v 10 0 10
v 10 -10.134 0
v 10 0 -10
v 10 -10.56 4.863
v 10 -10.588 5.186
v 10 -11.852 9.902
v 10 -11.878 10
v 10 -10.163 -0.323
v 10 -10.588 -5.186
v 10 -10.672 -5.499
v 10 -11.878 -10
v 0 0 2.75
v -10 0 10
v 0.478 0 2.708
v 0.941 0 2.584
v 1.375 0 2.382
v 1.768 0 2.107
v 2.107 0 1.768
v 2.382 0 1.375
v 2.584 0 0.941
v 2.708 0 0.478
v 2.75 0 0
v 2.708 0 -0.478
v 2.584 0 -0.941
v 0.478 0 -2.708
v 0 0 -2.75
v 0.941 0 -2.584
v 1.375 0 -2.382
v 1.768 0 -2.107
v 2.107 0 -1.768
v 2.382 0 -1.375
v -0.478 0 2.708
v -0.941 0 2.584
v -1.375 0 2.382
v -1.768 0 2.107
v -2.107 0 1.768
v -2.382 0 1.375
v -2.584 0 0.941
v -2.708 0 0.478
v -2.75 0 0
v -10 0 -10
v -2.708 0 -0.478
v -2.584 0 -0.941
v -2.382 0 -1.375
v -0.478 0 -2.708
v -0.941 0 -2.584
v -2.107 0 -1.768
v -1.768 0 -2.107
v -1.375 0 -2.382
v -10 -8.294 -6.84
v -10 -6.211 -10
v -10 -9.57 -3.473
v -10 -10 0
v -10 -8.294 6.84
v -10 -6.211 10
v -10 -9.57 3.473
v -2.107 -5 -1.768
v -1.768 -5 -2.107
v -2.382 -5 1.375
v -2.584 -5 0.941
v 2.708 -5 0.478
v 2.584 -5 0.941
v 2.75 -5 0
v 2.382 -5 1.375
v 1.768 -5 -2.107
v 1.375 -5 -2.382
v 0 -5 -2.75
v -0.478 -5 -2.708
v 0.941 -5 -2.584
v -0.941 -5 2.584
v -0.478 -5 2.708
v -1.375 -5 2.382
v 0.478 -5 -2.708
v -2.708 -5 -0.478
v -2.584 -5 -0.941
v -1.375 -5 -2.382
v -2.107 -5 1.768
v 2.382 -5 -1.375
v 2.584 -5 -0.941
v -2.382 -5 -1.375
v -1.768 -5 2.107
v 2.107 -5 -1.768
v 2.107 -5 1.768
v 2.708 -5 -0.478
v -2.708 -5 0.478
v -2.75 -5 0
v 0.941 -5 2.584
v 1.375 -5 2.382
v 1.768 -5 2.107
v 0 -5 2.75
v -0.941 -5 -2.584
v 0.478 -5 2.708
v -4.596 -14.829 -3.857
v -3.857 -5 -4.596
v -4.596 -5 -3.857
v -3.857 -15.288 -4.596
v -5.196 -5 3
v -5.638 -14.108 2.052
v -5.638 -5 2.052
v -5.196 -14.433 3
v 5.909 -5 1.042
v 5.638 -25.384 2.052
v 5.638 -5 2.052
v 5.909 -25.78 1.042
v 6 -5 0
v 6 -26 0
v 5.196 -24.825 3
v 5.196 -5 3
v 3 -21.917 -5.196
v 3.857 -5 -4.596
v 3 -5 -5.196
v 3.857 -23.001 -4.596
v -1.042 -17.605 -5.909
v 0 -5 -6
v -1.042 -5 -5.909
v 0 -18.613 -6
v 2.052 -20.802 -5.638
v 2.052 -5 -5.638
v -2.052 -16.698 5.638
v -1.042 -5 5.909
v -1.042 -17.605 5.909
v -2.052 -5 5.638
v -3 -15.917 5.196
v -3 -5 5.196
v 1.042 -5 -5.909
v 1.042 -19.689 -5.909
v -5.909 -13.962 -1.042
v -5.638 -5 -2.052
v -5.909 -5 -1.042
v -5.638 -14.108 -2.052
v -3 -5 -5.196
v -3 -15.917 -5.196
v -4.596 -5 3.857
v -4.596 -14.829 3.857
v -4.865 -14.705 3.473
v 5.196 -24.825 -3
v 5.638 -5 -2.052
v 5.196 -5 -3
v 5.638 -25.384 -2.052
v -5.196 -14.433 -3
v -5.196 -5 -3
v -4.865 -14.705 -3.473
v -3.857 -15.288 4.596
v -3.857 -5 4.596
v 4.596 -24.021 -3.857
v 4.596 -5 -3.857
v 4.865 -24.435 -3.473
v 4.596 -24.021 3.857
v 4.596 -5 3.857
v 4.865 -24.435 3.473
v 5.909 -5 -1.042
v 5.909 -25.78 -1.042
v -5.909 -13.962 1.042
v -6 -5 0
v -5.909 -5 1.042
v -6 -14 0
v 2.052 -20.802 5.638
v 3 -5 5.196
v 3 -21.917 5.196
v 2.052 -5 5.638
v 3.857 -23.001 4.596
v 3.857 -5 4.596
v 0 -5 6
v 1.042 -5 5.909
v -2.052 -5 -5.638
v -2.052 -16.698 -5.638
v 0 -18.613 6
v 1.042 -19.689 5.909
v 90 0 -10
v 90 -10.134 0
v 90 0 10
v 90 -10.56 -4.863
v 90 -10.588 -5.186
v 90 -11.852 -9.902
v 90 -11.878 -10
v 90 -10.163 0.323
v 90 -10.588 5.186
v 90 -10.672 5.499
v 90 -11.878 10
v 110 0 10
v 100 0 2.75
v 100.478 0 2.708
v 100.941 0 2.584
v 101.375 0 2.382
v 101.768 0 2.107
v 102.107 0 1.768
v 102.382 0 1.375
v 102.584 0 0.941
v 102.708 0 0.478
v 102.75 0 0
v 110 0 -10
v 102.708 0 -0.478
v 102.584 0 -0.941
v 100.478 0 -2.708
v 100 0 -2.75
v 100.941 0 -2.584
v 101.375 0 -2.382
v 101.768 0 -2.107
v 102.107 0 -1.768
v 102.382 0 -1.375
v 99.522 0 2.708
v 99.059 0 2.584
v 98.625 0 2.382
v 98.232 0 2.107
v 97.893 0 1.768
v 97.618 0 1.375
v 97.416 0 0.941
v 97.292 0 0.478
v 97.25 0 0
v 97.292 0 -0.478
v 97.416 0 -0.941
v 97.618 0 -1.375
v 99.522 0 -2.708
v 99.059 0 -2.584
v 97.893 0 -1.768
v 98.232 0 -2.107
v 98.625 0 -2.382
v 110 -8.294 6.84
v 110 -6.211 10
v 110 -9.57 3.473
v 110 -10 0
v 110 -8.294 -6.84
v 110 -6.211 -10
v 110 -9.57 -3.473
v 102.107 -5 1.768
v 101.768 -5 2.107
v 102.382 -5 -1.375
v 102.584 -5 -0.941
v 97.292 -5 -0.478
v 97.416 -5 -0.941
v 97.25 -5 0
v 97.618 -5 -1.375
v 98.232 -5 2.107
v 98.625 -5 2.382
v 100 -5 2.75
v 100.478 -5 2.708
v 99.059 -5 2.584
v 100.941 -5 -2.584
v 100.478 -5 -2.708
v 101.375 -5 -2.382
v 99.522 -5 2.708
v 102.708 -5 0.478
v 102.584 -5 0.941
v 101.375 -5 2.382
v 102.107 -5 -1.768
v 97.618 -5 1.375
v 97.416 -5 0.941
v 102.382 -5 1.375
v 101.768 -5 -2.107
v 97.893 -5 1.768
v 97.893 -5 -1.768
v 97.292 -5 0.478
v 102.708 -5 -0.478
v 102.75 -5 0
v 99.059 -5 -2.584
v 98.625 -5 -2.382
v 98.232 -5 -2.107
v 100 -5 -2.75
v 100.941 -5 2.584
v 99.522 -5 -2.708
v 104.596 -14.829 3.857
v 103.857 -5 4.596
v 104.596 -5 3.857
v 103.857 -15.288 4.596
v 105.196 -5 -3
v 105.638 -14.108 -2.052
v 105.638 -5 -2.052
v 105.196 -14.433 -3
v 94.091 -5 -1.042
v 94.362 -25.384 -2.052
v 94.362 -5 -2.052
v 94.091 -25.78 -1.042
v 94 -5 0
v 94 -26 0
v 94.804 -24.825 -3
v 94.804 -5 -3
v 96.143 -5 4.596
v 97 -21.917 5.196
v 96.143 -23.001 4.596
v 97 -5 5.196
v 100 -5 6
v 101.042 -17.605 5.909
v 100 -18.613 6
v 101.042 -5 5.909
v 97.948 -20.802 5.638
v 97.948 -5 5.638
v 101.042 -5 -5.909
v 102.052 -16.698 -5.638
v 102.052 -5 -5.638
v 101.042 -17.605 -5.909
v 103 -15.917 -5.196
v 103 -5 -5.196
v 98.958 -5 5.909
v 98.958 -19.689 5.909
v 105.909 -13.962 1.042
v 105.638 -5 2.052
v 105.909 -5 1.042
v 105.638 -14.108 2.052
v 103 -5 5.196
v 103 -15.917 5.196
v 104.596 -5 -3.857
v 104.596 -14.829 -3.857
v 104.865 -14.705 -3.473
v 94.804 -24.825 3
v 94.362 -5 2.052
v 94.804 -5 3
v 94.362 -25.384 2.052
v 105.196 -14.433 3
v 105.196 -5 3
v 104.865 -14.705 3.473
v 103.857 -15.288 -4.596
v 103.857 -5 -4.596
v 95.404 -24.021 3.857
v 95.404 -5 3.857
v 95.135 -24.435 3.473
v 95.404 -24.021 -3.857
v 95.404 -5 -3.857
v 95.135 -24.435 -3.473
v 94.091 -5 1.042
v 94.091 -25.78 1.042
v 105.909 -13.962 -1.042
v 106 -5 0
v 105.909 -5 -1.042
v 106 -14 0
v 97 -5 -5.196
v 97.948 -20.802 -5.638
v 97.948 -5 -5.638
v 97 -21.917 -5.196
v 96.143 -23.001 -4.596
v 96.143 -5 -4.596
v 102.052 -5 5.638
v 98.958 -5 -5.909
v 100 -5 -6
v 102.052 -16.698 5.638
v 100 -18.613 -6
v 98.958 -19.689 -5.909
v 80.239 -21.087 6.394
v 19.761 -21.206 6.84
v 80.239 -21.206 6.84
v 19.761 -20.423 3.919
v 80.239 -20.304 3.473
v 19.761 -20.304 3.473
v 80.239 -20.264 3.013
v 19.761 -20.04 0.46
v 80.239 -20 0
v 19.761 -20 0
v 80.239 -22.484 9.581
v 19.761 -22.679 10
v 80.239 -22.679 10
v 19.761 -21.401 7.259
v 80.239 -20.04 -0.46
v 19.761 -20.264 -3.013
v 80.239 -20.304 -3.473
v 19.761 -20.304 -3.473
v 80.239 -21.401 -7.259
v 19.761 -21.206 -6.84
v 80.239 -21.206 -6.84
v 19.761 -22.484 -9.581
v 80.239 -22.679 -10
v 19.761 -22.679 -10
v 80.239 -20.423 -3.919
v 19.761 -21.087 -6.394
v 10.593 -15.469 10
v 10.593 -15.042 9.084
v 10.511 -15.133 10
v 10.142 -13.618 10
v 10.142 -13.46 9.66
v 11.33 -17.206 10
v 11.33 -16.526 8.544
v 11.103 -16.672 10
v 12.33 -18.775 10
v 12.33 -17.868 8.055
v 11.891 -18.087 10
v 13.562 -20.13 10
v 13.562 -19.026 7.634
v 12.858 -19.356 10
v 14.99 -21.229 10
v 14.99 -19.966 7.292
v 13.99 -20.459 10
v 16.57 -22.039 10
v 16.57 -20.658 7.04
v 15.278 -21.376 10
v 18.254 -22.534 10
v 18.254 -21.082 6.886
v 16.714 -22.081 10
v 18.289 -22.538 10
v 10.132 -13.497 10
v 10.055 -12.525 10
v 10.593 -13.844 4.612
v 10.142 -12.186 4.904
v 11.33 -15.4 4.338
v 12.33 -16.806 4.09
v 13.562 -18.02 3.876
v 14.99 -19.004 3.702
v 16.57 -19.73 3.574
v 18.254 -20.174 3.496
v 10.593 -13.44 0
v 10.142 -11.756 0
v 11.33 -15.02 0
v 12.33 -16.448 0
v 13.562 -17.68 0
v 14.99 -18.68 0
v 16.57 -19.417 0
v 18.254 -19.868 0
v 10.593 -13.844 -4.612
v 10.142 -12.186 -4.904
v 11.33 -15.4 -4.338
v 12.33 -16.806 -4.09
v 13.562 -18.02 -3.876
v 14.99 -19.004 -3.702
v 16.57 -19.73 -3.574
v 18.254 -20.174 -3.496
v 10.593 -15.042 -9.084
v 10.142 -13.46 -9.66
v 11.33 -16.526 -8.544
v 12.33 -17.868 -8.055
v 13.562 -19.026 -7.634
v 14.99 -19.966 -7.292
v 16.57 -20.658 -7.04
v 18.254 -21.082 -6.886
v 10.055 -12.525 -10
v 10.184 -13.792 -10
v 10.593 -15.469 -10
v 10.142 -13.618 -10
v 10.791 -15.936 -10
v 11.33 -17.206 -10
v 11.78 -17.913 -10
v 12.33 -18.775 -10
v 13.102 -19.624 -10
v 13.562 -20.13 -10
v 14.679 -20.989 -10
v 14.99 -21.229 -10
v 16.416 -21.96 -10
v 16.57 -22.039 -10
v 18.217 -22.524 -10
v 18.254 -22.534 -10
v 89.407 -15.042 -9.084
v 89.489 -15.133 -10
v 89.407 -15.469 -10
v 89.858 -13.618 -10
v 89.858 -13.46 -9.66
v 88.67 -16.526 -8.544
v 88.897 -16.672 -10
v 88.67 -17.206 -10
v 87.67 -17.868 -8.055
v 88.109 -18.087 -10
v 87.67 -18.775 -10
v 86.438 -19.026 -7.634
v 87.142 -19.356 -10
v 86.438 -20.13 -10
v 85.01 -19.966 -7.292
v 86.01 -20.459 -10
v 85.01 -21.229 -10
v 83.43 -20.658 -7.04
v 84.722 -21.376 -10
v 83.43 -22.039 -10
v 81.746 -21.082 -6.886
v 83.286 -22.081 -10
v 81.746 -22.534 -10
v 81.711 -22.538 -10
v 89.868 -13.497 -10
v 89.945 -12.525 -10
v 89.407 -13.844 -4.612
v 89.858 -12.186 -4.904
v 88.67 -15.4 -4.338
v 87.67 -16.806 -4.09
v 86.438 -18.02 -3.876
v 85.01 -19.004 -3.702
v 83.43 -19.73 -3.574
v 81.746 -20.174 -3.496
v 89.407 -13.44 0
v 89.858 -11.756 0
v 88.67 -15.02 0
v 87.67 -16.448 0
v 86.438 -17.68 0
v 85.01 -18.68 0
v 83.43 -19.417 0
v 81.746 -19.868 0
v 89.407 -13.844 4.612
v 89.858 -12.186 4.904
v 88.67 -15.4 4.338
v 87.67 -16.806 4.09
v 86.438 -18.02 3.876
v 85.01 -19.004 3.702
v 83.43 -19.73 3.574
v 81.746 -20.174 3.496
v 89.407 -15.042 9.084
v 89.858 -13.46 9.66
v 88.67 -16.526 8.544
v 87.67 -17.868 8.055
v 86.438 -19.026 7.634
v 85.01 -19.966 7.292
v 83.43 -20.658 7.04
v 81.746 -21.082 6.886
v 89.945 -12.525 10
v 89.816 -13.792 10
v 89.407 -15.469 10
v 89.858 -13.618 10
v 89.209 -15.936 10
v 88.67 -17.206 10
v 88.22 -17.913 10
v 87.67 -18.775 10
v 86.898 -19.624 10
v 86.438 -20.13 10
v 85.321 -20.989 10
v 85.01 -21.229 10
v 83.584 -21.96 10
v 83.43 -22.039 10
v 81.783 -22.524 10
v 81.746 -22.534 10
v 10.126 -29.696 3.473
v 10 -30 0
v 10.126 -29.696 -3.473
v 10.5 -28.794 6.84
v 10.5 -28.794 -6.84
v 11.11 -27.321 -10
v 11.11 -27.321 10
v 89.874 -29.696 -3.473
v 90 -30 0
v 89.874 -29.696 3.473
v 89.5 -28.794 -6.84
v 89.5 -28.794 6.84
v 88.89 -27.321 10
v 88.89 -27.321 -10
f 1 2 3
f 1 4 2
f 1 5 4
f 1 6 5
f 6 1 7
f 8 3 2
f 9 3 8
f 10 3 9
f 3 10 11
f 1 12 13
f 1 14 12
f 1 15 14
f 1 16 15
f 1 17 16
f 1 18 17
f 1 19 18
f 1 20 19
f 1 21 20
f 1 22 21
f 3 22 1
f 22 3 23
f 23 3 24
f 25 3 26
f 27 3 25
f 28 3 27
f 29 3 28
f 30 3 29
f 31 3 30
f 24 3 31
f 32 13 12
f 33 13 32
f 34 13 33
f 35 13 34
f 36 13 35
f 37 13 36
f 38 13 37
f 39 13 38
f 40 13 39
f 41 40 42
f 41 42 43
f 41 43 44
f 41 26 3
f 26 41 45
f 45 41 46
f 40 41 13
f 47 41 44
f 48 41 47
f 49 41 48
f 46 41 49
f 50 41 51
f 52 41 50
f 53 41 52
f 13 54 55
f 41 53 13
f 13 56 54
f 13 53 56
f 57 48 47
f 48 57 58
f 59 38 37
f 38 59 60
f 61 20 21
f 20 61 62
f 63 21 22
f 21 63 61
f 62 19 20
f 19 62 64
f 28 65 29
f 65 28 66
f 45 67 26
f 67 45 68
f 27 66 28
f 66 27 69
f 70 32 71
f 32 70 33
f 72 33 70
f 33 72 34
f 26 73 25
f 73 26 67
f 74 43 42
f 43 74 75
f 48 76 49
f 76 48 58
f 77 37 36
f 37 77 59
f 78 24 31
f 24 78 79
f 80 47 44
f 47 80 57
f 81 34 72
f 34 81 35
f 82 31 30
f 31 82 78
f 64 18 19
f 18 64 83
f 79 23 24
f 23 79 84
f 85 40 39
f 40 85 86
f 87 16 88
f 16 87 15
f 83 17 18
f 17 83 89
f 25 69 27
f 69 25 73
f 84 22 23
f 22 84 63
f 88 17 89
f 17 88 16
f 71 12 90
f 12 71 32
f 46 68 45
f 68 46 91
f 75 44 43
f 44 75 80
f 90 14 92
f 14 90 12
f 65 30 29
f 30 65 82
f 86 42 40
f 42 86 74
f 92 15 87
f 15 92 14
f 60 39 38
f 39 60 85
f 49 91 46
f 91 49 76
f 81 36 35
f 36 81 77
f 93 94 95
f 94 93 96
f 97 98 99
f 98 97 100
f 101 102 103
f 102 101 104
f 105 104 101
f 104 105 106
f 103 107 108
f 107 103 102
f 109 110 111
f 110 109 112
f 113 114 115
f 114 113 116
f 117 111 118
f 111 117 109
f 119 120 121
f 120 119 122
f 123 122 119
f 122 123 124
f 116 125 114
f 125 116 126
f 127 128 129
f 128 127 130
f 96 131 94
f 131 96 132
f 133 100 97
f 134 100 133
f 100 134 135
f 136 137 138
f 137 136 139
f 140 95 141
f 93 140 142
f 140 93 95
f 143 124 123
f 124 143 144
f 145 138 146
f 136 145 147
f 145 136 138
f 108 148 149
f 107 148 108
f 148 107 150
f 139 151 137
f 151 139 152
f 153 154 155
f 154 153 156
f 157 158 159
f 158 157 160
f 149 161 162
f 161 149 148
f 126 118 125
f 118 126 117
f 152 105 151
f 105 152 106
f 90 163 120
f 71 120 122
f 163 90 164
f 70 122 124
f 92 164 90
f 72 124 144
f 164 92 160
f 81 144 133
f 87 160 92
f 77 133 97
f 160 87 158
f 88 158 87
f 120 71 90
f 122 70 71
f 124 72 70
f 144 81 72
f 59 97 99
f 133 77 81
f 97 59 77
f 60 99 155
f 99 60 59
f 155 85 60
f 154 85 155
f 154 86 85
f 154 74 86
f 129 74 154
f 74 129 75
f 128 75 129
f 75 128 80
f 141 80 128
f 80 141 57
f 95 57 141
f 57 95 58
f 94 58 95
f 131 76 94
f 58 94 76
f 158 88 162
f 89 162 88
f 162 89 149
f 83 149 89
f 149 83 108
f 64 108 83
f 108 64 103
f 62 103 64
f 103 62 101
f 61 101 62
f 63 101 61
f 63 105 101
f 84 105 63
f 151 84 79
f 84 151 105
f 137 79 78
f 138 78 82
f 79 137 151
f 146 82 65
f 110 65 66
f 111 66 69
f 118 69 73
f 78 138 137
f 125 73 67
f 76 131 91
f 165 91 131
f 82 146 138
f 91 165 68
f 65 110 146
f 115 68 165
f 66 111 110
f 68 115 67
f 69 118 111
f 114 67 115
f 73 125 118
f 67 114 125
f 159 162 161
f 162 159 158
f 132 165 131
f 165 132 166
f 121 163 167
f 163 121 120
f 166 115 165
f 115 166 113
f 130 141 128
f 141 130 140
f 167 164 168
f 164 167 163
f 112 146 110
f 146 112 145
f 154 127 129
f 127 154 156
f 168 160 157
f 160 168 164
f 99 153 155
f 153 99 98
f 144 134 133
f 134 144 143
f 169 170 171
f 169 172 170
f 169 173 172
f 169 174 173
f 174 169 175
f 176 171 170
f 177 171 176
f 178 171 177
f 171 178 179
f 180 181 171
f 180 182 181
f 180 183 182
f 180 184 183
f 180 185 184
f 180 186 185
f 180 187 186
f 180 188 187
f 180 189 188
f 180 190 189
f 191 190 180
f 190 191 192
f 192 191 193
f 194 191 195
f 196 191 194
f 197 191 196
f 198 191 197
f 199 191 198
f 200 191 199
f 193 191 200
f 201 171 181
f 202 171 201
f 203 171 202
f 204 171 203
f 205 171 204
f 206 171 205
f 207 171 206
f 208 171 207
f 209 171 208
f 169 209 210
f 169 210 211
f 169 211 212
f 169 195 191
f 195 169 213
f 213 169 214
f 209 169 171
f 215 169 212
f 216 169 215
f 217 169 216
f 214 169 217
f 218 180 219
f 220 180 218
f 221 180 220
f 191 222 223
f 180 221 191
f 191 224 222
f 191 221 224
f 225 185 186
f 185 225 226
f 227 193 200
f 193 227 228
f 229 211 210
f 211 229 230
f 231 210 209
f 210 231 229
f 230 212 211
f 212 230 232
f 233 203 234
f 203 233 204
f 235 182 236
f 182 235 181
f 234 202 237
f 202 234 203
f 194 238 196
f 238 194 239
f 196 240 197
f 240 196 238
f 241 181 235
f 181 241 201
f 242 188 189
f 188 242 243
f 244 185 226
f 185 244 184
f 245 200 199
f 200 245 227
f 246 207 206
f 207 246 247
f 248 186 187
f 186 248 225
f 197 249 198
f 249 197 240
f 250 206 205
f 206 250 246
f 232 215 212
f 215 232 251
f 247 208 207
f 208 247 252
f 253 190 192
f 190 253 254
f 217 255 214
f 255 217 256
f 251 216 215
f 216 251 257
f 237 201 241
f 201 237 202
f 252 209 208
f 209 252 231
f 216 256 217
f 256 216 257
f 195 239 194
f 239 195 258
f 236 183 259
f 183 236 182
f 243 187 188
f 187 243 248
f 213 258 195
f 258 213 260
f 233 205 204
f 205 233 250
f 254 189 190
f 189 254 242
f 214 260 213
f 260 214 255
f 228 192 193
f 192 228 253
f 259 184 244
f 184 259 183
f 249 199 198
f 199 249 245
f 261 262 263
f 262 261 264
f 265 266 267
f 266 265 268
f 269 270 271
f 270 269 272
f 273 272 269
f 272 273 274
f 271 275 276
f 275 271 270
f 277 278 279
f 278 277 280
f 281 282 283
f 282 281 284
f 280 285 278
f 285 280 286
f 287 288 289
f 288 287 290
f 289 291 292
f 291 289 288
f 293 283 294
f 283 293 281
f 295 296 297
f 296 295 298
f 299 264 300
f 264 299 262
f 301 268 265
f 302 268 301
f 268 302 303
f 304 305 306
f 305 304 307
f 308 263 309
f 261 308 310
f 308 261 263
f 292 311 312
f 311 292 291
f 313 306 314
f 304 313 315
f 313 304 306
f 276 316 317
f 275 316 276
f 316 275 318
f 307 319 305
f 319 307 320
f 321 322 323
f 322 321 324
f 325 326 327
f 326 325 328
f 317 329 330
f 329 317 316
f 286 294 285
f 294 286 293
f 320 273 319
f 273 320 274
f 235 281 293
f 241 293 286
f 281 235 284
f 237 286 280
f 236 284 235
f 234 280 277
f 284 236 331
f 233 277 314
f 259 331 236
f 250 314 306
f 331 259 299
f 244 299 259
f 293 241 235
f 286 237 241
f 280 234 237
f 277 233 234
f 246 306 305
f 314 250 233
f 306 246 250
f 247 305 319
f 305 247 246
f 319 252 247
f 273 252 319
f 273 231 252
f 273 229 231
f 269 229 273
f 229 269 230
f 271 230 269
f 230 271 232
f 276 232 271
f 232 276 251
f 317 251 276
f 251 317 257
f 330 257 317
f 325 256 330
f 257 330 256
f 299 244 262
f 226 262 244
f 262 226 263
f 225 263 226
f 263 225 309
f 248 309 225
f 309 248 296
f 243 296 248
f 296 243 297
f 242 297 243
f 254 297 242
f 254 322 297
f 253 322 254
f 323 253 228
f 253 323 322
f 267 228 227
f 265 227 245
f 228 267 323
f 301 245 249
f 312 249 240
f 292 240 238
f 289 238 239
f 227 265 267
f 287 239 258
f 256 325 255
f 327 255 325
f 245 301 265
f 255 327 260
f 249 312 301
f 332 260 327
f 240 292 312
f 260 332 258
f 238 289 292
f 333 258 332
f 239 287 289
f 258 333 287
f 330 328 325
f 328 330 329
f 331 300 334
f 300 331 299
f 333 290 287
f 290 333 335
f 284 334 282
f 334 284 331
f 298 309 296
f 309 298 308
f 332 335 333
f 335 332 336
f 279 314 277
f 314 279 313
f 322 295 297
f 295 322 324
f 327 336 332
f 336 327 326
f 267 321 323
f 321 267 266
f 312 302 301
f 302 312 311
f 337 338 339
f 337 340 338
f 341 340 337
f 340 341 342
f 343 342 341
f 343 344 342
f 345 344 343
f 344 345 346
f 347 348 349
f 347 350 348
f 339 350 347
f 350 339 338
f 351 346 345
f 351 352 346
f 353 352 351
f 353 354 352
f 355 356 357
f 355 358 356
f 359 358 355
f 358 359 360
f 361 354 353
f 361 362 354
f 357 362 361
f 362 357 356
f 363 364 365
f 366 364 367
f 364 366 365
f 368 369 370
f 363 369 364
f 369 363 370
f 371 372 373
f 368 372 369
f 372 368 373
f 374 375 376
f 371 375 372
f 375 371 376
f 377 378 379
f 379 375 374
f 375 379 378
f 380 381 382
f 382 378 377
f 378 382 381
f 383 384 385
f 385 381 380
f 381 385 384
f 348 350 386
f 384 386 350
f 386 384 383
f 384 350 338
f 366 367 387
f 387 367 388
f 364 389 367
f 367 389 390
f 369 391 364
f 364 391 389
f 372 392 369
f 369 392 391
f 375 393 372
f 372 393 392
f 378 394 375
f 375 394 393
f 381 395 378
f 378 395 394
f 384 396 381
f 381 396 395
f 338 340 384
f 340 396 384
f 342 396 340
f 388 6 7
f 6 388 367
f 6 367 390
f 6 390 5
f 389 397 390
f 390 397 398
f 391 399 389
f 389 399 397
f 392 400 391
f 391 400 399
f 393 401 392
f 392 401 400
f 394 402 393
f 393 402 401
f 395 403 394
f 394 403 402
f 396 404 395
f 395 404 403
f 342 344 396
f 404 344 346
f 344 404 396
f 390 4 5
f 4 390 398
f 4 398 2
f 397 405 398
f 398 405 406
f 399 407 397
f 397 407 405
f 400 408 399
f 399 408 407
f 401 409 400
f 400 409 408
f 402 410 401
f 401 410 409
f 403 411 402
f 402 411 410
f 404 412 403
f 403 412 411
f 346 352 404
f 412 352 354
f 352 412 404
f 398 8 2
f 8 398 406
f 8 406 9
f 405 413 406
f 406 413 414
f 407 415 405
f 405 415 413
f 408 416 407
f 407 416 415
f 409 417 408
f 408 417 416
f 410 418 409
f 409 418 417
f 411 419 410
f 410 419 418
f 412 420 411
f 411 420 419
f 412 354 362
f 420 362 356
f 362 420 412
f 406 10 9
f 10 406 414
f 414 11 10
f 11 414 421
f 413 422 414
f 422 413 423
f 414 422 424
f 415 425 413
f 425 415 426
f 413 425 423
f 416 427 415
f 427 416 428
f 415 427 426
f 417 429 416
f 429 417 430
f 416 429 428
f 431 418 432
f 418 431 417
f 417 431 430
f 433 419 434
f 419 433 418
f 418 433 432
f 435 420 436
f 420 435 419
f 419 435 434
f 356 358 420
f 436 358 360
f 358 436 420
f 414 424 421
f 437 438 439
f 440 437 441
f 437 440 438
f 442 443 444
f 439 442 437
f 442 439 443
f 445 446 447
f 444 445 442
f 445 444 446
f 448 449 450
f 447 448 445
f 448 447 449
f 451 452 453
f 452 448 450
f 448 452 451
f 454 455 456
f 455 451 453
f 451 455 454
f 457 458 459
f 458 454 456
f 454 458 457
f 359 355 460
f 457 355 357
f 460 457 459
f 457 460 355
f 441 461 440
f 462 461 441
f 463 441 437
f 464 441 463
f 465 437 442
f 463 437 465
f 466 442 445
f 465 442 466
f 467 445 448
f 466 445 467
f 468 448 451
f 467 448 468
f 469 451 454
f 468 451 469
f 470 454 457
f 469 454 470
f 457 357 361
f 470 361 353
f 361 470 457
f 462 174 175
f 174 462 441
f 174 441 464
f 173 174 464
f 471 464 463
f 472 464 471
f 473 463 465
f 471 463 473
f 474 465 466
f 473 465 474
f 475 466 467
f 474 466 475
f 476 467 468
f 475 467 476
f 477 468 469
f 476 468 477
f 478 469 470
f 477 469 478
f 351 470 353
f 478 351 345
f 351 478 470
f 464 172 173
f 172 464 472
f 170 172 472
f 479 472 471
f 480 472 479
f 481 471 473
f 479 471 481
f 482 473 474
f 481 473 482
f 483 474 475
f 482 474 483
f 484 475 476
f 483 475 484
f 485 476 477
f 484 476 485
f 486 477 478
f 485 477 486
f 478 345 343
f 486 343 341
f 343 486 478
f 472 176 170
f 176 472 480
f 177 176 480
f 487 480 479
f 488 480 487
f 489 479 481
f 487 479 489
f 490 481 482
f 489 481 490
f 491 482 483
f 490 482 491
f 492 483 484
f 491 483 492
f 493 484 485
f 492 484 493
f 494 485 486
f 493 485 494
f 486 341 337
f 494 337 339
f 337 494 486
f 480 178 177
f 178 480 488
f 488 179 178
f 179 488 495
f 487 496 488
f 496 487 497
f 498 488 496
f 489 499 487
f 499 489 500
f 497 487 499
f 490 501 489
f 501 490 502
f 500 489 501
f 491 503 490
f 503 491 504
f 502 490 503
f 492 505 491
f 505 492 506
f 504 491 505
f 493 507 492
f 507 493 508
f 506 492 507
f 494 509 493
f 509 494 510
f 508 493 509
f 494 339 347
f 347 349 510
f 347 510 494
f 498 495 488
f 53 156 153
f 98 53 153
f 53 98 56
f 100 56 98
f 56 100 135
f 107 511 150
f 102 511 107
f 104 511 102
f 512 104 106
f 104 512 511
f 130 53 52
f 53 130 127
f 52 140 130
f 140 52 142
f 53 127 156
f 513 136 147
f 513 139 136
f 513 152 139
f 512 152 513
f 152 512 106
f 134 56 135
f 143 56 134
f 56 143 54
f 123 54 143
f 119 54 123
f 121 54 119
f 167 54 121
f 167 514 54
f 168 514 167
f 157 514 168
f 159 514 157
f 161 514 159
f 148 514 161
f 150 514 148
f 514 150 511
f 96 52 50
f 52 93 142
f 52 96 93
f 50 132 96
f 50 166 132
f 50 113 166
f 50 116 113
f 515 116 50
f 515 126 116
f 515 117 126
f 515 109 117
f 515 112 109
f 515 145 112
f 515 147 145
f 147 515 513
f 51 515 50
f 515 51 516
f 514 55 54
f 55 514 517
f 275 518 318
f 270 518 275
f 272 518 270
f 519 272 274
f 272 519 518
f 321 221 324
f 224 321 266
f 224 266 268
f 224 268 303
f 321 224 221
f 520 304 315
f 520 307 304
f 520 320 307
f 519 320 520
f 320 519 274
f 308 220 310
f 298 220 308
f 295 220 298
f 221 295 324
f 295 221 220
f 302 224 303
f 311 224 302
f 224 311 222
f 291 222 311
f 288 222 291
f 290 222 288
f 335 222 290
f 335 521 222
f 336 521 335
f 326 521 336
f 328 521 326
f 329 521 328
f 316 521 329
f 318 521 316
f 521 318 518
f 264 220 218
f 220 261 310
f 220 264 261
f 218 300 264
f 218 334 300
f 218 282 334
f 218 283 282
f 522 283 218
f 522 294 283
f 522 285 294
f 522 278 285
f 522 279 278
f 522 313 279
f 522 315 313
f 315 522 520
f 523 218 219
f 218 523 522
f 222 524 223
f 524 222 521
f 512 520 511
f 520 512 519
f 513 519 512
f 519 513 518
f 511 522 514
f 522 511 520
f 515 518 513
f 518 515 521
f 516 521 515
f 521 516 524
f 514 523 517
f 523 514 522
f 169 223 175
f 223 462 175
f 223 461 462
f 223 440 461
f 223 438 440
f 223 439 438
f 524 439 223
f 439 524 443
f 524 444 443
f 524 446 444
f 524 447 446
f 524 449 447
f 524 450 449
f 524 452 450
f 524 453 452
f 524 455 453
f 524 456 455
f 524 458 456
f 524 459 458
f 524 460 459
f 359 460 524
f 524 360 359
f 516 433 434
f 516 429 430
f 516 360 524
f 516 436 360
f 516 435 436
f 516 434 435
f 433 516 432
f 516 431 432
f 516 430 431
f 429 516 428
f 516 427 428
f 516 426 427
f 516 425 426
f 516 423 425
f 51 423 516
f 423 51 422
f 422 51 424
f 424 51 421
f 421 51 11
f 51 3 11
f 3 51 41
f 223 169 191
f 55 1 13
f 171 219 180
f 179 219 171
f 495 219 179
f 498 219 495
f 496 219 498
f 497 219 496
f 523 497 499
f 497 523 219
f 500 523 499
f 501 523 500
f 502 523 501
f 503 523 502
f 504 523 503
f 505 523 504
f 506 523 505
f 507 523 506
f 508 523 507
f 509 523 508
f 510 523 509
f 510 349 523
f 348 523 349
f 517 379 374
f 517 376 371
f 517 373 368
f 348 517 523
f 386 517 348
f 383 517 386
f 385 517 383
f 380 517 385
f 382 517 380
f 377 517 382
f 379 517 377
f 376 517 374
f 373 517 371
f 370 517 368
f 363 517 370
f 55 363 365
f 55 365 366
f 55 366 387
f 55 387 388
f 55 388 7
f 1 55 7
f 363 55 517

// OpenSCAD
// Source: https://www.thingiverse.com/thing:1107453/files
// License: CC+Attribution
length = 120;
width = 20;
height = 30;
boltHoleDiameter = 5.5;
boltCounterboreDiameter = 12;
bottomThickness = 5;
filletRadius = 10;
$fn=36;

rHandle = 2 * (width/2);

module side() {
  difference() {
    translate([-width/2,-width,0]) {
      cube([width,width*2,height]);
    }
    translate([0, 0, -1]) cylinder(d=boltHoleDiameter, h=height+2);
    translate([0, 0, bottomThickness])cylinder(d=boltCounterboreDiameter, h=height);
  }
}

module topCurve() {
  difference() {
    translate([0,-width-rHandle]) cube([length*2, width*2+rHandle*2, height+rHandle*2]);
    rotate([0,90,0]) cylinder(r=rHandle, h=length*2);
  }
}

module sideCuts() {
  translate([-width/2,0,height-width]) 
    rotate([0, -45, 0]) 
      translate([-10,0,-rHandle]) topCurve();
}

rotate([90,0,0])
difference() {
  union() {
    side();
    translate([length-width,0,0]) rotate([0,0,180]) side();
    translate([width/2-0.01,0,height+rHandle/2]) rotate([0,90,0]) {
       cylinder(r=rHandle, h=length-width*2+0.02);
       translate([0,0,filletRadius]) fil_polar_i(R = rHandle+filletRadius-0.02, r=filletRadius);
       translate([0,0,length-width*2+0.02-filletRadius]) rotate([180,0,0]) fil_polar_i(R = rHandle+filletRadius-0.02, r=filletRadius);
    }
  }
  sideCuts();
  translate([length-width,0,0]) rotate([0,0,180]) sideCuts();
  translate([-length,-width-width/2,-1]) cube([length*3,width, height*2]);
  translate([-length,width/2,-1]) cube([length*3,width, height*2]);
  translate([-width, 0, height-rHandle]) topCurve();
}





/* 
  openscad-fillets by jfhbrook 
  https://github.com/jfhbrook/openscad-fillets

  fillets.scad contents included below
*/ 

// 2d primitive for outside fillets.
module fil_2d_o(r, angle=90) {
  intersection() {
    circle(r=r);
    polygon([
      [0, 0],
      [0, r],
      [r * tan(angle/2), r],
      [r * sin(angle), r * cos(angle)]
    ]);
  }
}

// 2d primitive for inside fillets.
module fil_2d_i(r, angle=90) {
  difference() {
    polygon([
      [0, 0],
      [0, -r],
      [-r * tan(angle/2), -r],
      [-r * sin(angle), -r * cos(angle)]
    ]);
    circle(r=r);
  }
}

// 3d polar outside fillet.
module fil_polar_o(R, r, angle=90) {
  rotate_extrude(convexity=10) {
    translate([R, 0, 0]) {
      fil_2d_o(r, angle);
    }
  }
}

// 3d polar inside fillet.
module fil_polar_i(R, r, angle=90) {
  rotate_extrude(convexity=10) {
    translate([R, 0, 0]) {
      fil_2d_i(r, angle);
    }
  }
}

// 3d linear outside fillet.
module fil_linear_o(l, r, angle=90) {
  rotate([0, -90, 180]) {
    linear_extrude(height=l, center=false) {
      fil_2d_o(r, angle);
    }
  }
}

// 3d linear inside fillet.
module fil_linear_o(l, r, angle=90) {
  rotate([0, -90, 180]) {
    linear_extrude(height=l, center=false) {
      fil_2d_i(r, angle);
    }
  }
}
